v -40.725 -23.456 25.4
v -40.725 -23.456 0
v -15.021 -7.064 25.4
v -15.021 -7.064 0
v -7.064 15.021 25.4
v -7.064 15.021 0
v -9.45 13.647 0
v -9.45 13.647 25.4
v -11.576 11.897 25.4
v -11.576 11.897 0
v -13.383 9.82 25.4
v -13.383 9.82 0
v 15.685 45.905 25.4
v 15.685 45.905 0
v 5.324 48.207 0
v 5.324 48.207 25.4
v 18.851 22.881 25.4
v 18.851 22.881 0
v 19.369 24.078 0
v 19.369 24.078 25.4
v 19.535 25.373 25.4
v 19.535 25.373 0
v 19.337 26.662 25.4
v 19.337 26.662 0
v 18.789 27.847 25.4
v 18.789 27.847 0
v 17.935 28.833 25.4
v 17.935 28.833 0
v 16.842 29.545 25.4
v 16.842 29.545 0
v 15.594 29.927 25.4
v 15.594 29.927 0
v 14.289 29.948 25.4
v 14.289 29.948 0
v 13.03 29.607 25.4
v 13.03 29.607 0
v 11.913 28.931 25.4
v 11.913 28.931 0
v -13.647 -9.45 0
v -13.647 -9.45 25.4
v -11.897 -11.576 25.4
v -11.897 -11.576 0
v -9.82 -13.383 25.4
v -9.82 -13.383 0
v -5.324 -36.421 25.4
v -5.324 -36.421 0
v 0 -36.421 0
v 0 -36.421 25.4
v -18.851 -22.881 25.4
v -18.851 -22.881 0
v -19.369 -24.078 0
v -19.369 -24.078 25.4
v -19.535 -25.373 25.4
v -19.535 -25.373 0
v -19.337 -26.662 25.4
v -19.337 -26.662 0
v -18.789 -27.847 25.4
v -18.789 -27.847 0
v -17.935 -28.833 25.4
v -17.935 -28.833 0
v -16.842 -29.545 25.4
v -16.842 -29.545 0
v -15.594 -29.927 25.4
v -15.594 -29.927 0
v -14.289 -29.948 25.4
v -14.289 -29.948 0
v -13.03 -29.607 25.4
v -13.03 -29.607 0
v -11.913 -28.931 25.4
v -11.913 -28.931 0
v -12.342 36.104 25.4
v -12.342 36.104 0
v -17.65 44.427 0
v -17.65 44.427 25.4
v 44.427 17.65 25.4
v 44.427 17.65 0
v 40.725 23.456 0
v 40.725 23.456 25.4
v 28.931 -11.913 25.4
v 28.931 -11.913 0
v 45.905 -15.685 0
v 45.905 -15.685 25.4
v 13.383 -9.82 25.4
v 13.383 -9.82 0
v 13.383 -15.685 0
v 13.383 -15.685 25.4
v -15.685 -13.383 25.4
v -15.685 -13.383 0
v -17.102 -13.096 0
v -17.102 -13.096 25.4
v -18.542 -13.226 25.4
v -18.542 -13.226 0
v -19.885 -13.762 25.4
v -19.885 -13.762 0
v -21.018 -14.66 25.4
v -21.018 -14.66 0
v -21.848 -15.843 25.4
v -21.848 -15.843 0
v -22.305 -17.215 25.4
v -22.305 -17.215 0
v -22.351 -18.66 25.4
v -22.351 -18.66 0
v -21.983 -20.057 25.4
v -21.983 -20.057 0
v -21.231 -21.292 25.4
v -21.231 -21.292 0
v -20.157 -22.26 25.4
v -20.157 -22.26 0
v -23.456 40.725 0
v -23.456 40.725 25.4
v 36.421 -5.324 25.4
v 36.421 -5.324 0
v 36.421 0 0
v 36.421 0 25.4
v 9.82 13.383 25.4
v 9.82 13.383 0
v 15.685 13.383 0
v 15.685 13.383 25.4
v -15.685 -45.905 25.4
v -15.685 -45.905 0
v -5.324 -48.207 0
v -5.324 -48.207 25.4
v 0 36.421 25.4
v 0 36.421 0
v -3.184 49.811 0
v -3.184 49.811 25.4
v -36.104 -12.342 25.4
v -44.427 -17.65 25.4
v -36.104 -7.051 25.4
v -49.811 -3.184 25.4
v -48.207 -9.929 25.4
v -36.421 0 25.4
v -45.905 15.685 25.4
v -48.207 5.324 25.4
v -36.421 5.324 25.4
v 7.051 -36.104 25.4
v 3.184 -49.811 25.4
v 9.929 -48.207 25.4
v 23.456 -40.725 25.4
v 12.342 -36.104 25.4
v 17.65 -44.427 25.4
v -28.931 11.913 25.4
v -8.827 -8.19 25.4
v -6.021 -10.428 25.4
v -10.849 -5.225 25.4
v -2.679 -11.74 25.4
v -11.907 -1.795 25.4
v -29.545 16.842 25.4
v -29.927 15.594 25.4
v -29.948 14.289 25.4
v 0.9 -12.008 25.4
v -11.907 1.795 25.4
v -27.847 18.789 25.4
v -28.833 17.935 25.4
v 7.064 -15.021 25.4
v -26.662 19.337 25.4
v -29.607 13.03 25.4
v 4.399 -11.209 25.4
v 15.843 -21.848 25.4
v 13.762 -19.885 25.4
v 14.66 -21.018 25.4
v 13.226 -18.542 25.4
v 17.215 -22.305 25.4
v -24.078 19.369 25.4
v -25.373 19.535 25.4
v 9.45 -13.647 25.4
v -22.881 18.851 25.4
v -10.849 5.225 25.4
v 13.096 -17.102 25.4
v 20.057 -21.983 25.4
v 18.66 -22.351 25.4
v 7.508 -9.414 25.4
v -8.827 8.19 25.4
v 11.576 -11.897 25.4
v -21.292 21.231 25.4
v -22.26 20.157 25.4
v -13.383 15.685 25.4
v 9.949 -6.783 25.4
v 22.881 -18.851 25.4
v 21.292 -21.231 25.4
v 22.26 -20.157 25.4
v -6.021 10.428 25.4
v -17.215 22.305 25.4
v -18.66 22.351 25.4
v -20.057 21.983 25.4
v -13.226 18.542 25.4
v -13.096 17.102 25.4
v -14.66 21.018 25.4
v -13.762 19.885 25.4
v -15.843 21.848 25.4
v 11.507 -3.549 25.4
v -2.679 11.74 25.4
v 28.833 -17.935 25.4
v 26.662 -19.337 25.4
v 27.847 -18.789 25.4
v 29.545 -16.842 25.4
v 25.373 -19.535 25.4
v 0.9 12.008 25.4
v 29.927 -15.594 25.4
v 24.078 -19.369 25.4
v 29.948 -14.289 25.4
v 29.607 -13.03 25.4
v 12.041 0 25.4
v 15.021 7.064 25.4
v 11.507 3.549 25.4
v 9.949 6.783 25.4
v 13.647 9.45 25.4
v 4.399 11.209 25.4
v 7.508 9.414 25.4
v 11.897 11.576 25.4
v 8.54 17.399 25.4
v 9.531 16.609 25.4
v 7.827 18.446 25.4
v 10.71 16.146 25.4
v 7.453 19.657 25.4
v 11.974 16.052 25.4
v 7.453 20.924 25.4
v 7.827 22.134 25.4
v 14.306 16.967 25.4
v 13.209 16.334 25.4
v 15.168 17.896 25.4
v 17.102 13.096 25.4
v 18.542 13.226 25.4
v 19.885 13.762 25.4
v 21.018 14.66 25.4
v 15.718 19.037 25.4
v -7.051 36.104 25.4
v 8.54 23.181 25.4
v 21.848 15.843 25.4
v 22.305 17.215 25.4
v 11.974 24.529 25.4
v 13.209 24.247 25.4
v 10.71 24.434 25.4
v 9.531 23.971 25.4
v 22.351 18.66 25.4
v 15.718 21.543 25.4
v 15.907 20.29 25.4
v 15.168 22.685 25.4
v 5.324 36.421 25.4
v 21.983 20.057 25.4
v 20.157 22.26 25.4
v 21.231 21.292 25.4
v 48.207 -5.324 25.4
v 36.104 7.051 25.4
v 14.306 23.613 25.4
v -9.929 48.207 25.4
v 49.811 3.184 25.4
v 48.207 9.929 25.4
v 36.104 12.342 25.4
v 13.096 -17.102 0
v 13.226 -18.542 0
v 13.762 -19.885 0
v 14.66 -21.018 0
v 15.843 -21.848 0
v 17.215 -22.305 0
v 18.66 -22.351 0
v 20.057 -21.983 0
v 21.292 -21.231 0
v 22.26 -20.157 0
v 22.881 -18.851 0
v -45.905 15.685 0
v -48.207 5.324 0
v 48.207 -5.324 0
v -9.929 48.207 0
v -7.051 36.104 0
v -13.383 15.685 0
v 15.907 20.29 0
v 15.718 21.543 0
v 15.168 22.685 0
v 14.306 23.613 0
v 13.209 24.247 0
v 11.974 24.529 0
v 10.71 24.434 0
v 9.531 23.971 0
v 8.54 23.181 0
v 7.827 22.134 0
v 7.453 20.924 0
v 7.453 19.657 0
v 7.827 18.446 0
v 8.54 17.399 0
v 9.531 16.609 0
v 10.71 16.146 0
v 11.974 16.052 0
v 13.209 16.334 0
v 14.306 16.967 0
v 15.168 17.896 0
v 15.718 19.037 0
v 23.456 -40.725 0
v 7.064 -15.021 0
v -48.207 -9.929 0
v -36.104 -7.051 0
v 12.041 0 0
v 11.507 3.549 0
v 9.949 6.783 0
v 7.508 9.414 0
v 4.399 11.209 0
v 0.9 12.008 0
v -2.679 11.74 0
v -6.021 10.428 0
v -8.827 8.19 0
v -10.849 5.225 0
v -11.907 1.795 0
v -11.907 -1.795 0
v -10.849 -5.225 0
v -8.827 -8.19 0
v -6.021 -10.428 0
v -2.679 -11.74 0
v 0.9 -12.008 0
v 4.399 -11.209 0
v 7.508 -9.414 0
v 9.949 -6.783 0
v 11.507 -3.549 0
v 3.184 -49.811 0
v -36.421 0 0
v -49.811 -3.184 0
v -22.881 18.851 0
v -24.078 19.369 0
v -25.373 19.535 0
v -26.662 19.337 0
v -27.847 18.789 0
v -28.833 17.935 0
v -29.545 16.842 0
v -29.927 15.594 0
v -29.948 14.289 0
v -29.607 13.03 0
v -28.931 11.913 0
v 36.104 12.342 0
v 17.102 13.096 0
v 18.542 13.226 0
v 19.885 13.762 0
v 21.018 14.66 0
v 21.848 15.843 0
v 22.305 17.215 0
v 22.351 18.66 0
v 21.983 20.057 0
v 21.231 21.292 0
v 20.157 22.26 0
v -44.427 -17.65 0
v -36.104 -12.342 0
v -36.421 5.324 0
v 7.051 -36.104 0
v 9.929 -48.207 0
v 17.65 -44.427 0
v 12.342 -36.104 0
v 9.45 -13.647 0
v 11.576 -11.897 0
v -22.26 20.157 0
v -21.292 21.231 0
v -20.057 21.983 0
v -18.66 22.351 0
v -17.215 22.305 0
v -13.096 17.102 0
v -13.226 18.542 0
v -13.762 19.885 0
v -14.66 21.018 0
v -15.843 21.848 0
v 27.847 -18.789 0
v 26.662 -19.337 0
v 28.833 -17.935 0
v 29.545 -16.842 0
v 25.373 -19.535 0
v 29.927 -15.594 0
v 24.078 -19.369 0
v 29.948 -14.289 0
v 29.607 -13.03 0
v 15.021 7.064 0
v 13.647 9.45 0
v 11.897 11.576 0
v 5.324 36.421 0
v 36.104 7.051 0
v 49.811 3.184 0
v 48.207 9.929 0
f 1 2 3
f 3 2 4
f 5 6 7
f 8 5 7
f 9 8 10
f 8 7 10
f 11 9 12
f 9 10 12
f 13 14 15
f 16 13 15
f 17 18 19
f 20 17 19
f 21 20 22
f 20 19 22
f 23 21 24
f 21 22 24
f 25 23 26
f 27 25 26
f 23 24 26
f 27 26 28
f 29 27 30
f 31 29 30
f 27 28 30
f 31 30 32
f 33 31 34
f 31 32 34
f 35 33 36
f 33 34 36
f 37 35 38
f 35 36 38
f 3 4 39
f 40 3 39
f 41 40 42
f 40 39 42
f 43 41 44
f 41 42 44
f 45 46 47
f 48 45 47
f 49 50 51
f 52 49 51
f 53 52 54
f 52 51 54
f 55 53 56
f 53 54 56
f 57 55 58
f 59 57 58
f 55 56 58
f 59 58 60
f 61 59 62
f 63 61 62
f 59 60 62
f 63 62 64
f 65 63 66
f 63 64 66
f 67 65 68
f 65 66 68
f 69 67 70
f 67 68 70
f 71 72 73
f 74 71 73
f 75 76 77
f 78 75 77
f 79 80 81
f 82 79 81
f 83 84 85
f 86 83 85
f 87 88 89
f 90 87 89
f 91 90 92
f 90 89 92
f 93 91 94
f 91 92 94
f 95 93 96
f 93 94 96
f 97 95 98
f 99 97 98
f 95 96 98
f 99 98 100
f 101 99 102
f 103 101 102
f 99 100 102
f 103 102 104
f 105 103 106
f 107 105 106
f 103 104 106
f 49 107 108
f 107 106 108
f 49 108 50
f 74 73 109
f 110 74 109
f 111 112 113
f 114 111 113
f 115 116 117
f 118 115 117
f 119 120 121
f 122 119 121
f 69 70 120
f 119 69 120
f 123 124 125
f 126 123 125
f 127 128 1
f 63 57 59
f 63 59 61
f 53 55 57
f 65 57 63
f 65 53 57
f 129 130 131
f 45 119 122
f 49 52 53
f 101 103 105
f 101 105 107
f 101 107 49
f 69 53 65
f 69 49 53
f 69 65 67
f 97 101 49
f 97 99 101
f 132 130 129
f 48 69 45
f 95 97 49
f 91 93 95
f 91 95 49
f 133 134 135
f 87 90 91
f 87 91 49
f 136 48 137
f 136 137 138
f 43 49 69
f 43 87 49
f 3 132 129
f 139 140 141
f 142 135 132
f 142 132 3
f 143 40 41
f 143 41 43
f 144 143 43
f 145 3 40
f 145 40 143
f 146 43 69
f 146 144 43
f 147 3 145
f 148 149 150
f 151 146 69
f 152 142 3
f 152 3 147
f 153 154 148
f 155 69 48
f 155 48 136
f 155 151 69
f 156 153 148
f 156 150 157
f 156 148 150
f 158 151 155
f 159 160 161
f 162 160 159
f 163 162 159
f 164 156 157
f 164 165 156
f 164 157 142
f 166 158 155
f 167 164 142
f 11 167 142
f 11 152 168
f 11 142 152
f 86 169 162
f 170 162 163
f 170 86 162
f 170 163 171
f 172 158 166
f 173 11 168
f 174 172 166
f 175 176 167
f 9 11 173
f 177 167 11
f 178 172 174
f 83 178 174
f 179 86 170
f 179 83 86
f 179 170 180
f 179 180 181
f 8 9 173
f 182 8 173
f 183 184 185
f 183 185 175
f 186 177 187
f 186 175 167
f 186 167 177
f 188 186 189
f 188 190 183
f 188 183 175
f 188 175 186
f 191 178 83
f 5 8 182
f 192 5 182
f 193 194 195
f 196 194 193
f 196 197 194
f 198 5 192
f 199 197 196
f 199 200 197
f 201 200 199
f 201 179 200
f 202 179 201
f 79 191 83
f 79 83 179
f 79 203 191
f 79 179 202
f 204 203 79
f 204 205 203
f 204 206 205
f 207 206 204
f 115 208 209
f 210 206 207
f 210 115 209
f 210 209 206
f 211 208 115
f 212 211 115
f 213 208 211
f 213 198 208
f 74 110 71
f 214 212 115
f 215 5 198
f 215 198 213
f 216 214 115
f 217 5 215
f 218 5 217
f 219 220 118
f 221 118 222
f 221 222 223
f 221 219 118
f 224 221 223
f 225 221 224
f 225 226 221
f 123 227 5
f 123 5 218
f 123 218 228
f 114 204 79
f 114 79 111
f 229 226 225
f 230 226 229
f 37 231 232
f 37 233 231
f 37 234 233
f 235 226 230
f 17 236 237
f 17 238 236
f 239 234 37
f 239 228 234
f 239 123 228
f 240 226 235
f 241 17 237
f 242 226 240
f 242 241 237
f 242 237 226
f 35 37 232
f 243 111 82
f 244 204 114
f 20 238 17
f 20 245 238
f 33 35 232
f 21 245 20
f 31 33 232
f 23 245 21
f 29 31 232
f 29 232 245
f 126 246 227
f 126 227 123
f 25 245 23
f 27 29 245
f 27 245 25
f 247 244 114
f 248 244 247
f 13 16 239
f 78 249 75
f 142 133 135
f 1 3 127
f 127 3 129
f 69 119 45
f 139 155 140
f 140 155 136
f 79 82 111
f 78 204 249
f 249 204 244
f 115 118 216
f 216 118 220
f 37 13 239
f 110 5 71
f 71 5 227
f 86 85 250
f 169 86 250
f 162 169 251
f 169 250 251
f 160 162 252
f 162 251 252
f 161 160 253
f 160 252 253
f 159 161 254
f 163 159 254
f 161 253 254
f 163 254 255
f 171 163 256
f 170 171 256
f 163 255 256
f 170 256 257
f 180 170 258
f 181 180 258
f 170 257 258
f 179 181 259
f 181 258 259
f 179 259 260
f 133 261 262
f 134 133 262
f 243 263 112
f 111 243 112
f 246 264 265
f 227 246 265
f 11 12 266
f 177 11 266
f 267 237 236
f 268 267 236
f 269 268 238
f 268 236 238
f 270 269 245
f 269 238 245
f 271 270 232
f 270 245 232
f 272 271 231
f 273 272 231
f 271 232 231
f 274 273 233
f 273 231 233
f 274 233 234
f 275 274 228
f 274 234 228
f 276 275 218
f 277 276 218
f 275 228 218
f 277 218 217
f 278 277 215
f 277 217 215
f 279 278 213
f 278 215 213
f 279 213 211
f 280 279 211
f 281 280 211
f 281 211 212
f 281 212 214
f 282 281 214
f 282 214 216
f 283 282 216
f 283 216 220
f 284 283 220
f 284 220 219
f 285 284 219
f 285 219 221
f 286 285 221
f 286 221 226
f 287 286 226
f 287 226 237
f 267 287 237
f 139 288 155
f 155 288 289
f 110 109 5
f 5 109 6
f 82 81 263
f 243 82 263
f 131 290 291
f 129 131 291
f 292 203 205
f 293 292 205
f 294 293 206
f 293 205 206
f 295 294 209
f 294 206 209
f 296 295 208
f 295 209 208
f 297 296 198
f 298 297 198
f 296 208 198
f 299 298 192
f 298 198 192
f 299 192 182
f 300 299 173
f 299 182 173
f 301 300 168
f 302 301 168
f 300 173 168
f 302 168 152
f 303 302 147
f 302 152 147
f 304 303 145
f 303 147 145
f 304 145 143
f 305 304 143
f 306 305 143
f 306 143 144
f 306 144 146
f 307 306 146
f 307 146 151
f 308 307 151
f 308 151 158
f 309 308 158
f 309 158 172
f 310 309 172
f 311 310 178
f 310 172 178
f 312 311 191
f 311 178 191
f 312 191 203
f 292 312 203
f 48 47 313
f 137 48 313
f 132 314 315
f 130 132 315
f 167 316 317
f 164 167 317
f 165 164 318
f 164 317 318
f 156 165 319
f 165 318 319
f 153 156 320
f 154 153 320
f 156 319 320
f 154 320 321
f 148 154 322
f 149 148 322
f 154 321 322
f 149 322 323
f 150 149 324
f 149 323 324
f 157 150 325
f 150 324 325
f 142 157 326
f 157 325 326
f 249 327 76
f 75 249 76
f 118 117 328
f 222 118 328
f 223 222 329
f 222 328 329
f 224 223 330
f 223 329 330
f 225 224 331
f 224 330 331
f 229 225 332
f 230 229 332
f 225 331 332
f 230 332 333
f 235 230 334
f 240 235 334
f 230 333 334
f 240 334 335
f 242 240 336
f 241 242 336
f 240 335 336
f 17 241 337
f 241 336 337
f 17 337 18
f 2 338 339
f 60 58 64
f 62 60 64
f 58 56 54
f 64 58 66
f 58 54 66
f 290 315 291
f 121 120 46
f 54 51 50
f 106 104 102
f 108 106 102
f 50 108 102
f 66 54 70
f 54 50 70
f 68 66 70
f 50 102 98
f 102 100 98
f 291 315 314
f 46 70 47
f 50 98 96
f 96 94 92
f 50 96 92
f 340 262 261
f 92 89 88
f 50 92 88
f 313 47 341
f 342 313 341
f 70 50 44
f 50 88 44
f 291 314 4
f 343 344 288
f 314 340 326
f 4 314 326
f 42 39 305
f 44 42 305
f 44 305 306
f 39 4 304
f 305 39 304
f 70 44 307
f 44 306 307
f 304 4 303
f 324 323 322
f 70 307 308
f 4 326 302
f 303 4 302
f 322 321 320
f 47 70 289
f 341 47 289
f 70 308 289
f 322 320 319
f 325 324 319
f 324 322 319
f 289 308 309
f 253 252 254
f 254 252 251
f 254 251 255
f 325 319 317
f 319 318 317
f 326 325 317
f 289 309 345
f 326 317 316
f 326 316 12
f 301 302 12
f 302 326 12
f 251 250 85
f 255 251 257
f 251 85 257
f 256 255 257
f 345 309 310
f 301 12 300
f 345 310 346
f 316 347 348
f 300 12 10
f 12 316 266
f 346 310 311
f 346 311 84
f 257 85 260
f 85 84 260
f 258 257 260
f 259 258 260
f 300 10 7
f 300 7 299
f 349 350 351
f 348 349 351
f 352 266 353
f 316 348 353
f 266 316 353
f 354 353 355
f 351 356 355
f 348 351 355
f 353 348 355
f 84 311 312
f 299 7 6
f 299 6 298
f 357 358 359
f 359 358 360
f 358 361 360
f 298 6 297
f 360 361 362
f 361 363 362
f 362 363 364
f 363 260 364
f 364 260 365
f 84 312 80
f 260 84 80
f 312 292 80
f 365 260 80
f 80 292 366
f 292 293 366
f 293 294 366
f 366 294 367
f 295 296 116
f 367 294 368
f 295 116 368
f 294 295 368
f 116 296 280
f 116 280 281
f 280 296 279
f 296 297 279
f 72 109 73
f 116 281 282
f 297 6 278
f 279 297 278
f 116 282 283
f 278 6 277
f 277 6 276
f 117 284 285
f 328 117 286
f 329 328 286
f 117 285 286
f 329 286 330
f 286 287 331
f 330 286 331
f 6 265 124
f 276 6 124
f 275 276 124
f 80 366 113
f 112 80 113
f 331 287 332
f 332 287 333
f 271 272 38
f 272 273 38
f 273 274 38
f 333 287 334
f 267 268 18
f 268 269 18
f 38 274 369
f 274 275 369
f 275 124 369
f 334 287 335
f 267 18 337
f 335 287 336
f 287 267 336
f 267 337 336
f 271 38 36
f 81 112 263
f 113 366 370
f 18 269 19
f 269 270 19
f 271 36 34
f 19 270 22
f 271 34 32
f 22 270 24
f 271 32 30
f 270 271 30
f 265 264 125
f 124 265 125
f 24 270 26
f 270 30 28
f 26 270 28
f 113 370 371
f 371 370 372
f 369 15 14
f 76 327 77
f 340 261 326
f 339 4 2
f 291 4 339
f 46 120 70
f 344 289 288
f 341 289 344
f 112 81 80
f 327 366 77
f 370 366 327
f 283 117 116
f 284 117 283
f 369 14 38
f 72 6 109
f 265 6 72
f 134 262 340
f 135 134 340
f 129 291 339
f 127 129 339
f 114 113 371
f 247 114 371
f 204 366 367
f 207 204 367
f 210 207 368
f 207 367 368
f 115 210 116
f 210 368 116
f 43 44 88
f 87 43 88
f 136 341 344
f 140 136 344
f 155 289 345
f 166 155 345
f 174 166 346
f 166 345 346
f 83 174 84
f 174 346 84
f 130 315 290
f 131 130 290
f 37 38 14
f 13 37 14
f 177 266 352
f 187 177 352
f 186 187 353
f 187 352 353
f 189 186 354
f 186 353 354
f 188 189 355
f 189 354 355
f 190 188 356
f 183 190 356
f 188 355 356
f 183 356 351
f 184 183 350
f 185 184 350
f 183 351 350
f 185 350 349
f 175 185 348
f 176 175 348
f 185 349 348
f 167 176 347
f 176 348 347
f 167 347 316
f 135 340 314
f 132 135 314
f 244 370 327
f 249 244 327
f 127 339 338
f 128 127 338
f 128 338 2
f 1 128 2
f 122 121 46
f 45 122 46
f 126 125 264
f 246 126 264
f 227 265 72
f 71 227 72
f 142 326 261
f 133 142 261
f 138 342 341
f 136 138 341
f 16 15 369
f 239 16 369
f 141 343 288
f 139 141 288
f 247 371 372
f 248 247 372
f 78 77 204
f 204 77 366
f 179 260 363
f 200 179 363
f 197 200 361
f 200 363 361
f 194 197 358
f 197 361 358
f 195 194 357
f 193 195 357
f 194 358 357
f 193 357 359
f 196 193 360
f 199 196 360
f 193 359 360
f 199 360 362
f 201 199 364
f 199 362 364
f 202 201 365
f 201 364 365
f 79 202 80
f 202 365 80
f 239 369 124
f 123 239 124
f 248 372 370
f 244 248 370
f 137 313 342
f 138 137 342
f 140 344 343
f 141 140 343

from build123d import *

# Parameters (mm, degrees)
F1_DEPTH = 25.4
F2_R     = 12.041499
F3_DEPTH = 25.4
F4_R     = 4.250417
F5_DEPTH = 25.401


with BuildPart() as f1:
    # F0 (on Top) → F1 (new body)
    with BuildSketch(Plane.XY):
        with BuildLine():
            ThreePointArc((-15.021411, -7.063877), (-16.521823, 1.603285), (-13.382968, 9.82025))
            Line((-13.382968, 9.82025), (-13.382968, 15.685415))
            ThreePointArc((-13.382968, 15.685415), (-16.512447, 22.126296), (-22.880558, 18.851278))
            ThreePointArc((-22.880558, 18.851278), (-28.833329, 17.93548), (-28.931248, 11.913473))
            Line((-28.931248, 11.913473), (-45.90502, 15.685415))
            Line((-45.90502, 15.685415), (-48.207462, 5.324407))
            Line((-48.207462, 5.324407), (-36.421049, 5.324407))
            Line((-36.421049, 5.324407), (-36.421049, 0))
            Line((-36.421049, 0), (-49.811375, -3.183969))
            Line((-49.811375, -3.183969), (-48.207462, -9.929298))
            Line((-48.207462, -9.929298), (-36.103659, -7.05124))
            Line((-36.103659, -7.05124), (-36.103659, -12.34197))
            Line((-36.103659, -12.34197), (-44.427202, -17.650355))
            Line((-44.427202, -17.650355), (-40.724512, -23.456169))
            Line((-40.724512, -23.456169), (-15.021411, -7.063877))
        make_face()
        with BuildLine():
            ThreePointArc((13.382968, -9.82025), (15.774835, -5.166792), (16.599433, 0))
            ThreePointArc((16.599433, 0), (16.200124, 3.618995), (15.021411, 7.063877))
            ThreePointArc((15.021411, 7.063877), (12.816387, 10.549), (9.82025, 13.382968))
            ThreePointArc((9.82025, 13.382968), (1.603285, 16.521823), (-7.063877, 15.021411))
            ThreePointArc((-7.063877, 15.021411), (-10.549, 12.816387), (-13.382968, 9.82025))
            ThreePointArc((-13.382968, 9.82025), (-16.521823, 1.603285), (-15.021411, -7.063877))
            ThreePointArc((-15.021411, -7.063877), (-12.816387, -10.549), (-9.82025, -13.382968))
            ThreePointArc((-9.82025, -13.382968), (-1.603285, -16.521823), (7.063877, -15.021411))
            ThreePointArc((7.063877, -15.021411), (10.549, -12.816387), (13.382968, -9.82025))
        make_face()
        with BuildLine():
            ThreePointArc((15.021411, 7.063877), (16.200124, 3.618995), (16.599433, 0))
            ThreePointArc((16.599433, 0), (15.774835, -5.166792), (13.382968, -9.82025))
            Line((13.382968, -9.82025), (13.382968, -15.685415))
            ThreePointArc((13.382968, -15.685415), (16.512447, -22.126296), (22.880558, -18.851278))
            ThreePointArc((22.880558, -18.851278), (28.833329, -17.93548), (28.931248, -11.913473))
            Line((28.931248, -11.913473), (45.90502, -15.685415))
            Line((45.90502, -15.685415), (48.207462, -5.324407))
            Line((48.207462, -5.324407), (36.421049, -5.324407))
            Line((36.421049, -5.324407), (36.421049, 0))
            Line((36.421049, 0), (49.811375, 3.183969))
            Line((49.811375, 3.183969), (48.207462, 9.929298))
            Line((48.207462, 9.929298), (36.103659, 7.05124))
            Line((36.103659, 7.05124), (36.103659, 12.34197))
            Line((36.103659, 12.34197), (44.427202, 17.650355))
            Line((44.427202, 17.650355), (40.724512, 23.456169))
            Line((40.724512, 23.456169), (15.021411, 7.063877))
        make_face()
        with BuildLine():
            Line((23.456169, -40.724512), (7.063877, -15.021411))
            ThreePointArc((7.063877, -15.021411), (-1.603285, -16.521823), (-9.82025, -13.382968))
            Line((-9.82025, -13.382968), (-15.685415, -13.382968))
            ThreePointArc((-15.685415, -13.382968), (-22.126296, -16.512447), (-18.851278, -22.880558))
            ThreePointArc((-18.851278, -22.880558), (-17.93548, -28.833329), (-11.913473, -28.931248))
            Line((-11.913473, -28.931248), (-15.685415, -45.90502))
            Line((-15.685415, -45.90502), (-5.324407, -48.207462))
            Line((-5.324407, -48.207462), (-5.324407, -36.421049))
            Line((-5.324407, -36.421049), (0, -36.421049))
            Line((0, -36.421049), (3.183969, -49.811375))
            Line((3.183969, -49.811375), (9.929298, -48.207462))
            Line((9.929298, -48.207462), (7.05124, -36.103659))
            Line((7.05124, -36.103659), (12.34197, -36.103659))
            Line((12.34197, -36.103659), (17.650355, -44.427202))
            Line((17.650355, -44.427202), (23.456169, -40.724512))
        make_face()
        with BuildLine():
            ThreePointArc((-7.063877, 15.021411), (1.603285, 16.521823), (9.82025, 13.382968))
            Line((9.82025, 13.382968), (15.685415, 13.382968))
            ThreePointArc((15.685415, 13.382968), (22.126296, 16.512447), (18.851278, 22.880558))
            ThreePointArc((18.851278, 22.880558), (17.93548, 28.833329), (11.913473, 28.931248))
            Line((11.913473, 28.931248), (15.685415, 45.90502))
            Line((15.685415, 45.90502), (5.324407, 48.207462))
            Line((5.324407, 48.207462), (5.324407, 36.421049))
            Line((5.324407, 36.421049), (0, 36.421049))
            Line((0, 36.421049), (-3.183969, 49.811375))
            Line((-3.183969, 49.811375), (-9.929298, 48.207462))
            Line((-9.929298, 48.207462), (-7.05124, 36.103659))
            Line((-7.05124, 36.103659), (-12.34197, 36.103659))
            Line((-12.34197, 36.103659), (-17.650355, 44.427202))
            Line((-17.650355, 44.427202), (-23.456169, 40.724512))
            Line((-23.456169, 40.724512), (-7.063877, 15.021411))
        make_face()
    extrude(amount=F1_DEPTH)

    # F2 (on face) → F3 (cut)
    with BuildSketch(Plane.XY.offset(25.4)):
        Circle(F2_R)
    extrude(amount=-F3_DEPTH, mode=Mode.SUBTRACT)

    # F4 (on face) → F5 (cut, through all)
    with BuildSketch(Plane.XY.offset(25.4)):
        with Locations((11.656133, 20.290306)):
            Circle(F4_R)
    extrude(amount=-F5_DEPTH, mode=Mode.SUBTRACT)


solid = f1.part
